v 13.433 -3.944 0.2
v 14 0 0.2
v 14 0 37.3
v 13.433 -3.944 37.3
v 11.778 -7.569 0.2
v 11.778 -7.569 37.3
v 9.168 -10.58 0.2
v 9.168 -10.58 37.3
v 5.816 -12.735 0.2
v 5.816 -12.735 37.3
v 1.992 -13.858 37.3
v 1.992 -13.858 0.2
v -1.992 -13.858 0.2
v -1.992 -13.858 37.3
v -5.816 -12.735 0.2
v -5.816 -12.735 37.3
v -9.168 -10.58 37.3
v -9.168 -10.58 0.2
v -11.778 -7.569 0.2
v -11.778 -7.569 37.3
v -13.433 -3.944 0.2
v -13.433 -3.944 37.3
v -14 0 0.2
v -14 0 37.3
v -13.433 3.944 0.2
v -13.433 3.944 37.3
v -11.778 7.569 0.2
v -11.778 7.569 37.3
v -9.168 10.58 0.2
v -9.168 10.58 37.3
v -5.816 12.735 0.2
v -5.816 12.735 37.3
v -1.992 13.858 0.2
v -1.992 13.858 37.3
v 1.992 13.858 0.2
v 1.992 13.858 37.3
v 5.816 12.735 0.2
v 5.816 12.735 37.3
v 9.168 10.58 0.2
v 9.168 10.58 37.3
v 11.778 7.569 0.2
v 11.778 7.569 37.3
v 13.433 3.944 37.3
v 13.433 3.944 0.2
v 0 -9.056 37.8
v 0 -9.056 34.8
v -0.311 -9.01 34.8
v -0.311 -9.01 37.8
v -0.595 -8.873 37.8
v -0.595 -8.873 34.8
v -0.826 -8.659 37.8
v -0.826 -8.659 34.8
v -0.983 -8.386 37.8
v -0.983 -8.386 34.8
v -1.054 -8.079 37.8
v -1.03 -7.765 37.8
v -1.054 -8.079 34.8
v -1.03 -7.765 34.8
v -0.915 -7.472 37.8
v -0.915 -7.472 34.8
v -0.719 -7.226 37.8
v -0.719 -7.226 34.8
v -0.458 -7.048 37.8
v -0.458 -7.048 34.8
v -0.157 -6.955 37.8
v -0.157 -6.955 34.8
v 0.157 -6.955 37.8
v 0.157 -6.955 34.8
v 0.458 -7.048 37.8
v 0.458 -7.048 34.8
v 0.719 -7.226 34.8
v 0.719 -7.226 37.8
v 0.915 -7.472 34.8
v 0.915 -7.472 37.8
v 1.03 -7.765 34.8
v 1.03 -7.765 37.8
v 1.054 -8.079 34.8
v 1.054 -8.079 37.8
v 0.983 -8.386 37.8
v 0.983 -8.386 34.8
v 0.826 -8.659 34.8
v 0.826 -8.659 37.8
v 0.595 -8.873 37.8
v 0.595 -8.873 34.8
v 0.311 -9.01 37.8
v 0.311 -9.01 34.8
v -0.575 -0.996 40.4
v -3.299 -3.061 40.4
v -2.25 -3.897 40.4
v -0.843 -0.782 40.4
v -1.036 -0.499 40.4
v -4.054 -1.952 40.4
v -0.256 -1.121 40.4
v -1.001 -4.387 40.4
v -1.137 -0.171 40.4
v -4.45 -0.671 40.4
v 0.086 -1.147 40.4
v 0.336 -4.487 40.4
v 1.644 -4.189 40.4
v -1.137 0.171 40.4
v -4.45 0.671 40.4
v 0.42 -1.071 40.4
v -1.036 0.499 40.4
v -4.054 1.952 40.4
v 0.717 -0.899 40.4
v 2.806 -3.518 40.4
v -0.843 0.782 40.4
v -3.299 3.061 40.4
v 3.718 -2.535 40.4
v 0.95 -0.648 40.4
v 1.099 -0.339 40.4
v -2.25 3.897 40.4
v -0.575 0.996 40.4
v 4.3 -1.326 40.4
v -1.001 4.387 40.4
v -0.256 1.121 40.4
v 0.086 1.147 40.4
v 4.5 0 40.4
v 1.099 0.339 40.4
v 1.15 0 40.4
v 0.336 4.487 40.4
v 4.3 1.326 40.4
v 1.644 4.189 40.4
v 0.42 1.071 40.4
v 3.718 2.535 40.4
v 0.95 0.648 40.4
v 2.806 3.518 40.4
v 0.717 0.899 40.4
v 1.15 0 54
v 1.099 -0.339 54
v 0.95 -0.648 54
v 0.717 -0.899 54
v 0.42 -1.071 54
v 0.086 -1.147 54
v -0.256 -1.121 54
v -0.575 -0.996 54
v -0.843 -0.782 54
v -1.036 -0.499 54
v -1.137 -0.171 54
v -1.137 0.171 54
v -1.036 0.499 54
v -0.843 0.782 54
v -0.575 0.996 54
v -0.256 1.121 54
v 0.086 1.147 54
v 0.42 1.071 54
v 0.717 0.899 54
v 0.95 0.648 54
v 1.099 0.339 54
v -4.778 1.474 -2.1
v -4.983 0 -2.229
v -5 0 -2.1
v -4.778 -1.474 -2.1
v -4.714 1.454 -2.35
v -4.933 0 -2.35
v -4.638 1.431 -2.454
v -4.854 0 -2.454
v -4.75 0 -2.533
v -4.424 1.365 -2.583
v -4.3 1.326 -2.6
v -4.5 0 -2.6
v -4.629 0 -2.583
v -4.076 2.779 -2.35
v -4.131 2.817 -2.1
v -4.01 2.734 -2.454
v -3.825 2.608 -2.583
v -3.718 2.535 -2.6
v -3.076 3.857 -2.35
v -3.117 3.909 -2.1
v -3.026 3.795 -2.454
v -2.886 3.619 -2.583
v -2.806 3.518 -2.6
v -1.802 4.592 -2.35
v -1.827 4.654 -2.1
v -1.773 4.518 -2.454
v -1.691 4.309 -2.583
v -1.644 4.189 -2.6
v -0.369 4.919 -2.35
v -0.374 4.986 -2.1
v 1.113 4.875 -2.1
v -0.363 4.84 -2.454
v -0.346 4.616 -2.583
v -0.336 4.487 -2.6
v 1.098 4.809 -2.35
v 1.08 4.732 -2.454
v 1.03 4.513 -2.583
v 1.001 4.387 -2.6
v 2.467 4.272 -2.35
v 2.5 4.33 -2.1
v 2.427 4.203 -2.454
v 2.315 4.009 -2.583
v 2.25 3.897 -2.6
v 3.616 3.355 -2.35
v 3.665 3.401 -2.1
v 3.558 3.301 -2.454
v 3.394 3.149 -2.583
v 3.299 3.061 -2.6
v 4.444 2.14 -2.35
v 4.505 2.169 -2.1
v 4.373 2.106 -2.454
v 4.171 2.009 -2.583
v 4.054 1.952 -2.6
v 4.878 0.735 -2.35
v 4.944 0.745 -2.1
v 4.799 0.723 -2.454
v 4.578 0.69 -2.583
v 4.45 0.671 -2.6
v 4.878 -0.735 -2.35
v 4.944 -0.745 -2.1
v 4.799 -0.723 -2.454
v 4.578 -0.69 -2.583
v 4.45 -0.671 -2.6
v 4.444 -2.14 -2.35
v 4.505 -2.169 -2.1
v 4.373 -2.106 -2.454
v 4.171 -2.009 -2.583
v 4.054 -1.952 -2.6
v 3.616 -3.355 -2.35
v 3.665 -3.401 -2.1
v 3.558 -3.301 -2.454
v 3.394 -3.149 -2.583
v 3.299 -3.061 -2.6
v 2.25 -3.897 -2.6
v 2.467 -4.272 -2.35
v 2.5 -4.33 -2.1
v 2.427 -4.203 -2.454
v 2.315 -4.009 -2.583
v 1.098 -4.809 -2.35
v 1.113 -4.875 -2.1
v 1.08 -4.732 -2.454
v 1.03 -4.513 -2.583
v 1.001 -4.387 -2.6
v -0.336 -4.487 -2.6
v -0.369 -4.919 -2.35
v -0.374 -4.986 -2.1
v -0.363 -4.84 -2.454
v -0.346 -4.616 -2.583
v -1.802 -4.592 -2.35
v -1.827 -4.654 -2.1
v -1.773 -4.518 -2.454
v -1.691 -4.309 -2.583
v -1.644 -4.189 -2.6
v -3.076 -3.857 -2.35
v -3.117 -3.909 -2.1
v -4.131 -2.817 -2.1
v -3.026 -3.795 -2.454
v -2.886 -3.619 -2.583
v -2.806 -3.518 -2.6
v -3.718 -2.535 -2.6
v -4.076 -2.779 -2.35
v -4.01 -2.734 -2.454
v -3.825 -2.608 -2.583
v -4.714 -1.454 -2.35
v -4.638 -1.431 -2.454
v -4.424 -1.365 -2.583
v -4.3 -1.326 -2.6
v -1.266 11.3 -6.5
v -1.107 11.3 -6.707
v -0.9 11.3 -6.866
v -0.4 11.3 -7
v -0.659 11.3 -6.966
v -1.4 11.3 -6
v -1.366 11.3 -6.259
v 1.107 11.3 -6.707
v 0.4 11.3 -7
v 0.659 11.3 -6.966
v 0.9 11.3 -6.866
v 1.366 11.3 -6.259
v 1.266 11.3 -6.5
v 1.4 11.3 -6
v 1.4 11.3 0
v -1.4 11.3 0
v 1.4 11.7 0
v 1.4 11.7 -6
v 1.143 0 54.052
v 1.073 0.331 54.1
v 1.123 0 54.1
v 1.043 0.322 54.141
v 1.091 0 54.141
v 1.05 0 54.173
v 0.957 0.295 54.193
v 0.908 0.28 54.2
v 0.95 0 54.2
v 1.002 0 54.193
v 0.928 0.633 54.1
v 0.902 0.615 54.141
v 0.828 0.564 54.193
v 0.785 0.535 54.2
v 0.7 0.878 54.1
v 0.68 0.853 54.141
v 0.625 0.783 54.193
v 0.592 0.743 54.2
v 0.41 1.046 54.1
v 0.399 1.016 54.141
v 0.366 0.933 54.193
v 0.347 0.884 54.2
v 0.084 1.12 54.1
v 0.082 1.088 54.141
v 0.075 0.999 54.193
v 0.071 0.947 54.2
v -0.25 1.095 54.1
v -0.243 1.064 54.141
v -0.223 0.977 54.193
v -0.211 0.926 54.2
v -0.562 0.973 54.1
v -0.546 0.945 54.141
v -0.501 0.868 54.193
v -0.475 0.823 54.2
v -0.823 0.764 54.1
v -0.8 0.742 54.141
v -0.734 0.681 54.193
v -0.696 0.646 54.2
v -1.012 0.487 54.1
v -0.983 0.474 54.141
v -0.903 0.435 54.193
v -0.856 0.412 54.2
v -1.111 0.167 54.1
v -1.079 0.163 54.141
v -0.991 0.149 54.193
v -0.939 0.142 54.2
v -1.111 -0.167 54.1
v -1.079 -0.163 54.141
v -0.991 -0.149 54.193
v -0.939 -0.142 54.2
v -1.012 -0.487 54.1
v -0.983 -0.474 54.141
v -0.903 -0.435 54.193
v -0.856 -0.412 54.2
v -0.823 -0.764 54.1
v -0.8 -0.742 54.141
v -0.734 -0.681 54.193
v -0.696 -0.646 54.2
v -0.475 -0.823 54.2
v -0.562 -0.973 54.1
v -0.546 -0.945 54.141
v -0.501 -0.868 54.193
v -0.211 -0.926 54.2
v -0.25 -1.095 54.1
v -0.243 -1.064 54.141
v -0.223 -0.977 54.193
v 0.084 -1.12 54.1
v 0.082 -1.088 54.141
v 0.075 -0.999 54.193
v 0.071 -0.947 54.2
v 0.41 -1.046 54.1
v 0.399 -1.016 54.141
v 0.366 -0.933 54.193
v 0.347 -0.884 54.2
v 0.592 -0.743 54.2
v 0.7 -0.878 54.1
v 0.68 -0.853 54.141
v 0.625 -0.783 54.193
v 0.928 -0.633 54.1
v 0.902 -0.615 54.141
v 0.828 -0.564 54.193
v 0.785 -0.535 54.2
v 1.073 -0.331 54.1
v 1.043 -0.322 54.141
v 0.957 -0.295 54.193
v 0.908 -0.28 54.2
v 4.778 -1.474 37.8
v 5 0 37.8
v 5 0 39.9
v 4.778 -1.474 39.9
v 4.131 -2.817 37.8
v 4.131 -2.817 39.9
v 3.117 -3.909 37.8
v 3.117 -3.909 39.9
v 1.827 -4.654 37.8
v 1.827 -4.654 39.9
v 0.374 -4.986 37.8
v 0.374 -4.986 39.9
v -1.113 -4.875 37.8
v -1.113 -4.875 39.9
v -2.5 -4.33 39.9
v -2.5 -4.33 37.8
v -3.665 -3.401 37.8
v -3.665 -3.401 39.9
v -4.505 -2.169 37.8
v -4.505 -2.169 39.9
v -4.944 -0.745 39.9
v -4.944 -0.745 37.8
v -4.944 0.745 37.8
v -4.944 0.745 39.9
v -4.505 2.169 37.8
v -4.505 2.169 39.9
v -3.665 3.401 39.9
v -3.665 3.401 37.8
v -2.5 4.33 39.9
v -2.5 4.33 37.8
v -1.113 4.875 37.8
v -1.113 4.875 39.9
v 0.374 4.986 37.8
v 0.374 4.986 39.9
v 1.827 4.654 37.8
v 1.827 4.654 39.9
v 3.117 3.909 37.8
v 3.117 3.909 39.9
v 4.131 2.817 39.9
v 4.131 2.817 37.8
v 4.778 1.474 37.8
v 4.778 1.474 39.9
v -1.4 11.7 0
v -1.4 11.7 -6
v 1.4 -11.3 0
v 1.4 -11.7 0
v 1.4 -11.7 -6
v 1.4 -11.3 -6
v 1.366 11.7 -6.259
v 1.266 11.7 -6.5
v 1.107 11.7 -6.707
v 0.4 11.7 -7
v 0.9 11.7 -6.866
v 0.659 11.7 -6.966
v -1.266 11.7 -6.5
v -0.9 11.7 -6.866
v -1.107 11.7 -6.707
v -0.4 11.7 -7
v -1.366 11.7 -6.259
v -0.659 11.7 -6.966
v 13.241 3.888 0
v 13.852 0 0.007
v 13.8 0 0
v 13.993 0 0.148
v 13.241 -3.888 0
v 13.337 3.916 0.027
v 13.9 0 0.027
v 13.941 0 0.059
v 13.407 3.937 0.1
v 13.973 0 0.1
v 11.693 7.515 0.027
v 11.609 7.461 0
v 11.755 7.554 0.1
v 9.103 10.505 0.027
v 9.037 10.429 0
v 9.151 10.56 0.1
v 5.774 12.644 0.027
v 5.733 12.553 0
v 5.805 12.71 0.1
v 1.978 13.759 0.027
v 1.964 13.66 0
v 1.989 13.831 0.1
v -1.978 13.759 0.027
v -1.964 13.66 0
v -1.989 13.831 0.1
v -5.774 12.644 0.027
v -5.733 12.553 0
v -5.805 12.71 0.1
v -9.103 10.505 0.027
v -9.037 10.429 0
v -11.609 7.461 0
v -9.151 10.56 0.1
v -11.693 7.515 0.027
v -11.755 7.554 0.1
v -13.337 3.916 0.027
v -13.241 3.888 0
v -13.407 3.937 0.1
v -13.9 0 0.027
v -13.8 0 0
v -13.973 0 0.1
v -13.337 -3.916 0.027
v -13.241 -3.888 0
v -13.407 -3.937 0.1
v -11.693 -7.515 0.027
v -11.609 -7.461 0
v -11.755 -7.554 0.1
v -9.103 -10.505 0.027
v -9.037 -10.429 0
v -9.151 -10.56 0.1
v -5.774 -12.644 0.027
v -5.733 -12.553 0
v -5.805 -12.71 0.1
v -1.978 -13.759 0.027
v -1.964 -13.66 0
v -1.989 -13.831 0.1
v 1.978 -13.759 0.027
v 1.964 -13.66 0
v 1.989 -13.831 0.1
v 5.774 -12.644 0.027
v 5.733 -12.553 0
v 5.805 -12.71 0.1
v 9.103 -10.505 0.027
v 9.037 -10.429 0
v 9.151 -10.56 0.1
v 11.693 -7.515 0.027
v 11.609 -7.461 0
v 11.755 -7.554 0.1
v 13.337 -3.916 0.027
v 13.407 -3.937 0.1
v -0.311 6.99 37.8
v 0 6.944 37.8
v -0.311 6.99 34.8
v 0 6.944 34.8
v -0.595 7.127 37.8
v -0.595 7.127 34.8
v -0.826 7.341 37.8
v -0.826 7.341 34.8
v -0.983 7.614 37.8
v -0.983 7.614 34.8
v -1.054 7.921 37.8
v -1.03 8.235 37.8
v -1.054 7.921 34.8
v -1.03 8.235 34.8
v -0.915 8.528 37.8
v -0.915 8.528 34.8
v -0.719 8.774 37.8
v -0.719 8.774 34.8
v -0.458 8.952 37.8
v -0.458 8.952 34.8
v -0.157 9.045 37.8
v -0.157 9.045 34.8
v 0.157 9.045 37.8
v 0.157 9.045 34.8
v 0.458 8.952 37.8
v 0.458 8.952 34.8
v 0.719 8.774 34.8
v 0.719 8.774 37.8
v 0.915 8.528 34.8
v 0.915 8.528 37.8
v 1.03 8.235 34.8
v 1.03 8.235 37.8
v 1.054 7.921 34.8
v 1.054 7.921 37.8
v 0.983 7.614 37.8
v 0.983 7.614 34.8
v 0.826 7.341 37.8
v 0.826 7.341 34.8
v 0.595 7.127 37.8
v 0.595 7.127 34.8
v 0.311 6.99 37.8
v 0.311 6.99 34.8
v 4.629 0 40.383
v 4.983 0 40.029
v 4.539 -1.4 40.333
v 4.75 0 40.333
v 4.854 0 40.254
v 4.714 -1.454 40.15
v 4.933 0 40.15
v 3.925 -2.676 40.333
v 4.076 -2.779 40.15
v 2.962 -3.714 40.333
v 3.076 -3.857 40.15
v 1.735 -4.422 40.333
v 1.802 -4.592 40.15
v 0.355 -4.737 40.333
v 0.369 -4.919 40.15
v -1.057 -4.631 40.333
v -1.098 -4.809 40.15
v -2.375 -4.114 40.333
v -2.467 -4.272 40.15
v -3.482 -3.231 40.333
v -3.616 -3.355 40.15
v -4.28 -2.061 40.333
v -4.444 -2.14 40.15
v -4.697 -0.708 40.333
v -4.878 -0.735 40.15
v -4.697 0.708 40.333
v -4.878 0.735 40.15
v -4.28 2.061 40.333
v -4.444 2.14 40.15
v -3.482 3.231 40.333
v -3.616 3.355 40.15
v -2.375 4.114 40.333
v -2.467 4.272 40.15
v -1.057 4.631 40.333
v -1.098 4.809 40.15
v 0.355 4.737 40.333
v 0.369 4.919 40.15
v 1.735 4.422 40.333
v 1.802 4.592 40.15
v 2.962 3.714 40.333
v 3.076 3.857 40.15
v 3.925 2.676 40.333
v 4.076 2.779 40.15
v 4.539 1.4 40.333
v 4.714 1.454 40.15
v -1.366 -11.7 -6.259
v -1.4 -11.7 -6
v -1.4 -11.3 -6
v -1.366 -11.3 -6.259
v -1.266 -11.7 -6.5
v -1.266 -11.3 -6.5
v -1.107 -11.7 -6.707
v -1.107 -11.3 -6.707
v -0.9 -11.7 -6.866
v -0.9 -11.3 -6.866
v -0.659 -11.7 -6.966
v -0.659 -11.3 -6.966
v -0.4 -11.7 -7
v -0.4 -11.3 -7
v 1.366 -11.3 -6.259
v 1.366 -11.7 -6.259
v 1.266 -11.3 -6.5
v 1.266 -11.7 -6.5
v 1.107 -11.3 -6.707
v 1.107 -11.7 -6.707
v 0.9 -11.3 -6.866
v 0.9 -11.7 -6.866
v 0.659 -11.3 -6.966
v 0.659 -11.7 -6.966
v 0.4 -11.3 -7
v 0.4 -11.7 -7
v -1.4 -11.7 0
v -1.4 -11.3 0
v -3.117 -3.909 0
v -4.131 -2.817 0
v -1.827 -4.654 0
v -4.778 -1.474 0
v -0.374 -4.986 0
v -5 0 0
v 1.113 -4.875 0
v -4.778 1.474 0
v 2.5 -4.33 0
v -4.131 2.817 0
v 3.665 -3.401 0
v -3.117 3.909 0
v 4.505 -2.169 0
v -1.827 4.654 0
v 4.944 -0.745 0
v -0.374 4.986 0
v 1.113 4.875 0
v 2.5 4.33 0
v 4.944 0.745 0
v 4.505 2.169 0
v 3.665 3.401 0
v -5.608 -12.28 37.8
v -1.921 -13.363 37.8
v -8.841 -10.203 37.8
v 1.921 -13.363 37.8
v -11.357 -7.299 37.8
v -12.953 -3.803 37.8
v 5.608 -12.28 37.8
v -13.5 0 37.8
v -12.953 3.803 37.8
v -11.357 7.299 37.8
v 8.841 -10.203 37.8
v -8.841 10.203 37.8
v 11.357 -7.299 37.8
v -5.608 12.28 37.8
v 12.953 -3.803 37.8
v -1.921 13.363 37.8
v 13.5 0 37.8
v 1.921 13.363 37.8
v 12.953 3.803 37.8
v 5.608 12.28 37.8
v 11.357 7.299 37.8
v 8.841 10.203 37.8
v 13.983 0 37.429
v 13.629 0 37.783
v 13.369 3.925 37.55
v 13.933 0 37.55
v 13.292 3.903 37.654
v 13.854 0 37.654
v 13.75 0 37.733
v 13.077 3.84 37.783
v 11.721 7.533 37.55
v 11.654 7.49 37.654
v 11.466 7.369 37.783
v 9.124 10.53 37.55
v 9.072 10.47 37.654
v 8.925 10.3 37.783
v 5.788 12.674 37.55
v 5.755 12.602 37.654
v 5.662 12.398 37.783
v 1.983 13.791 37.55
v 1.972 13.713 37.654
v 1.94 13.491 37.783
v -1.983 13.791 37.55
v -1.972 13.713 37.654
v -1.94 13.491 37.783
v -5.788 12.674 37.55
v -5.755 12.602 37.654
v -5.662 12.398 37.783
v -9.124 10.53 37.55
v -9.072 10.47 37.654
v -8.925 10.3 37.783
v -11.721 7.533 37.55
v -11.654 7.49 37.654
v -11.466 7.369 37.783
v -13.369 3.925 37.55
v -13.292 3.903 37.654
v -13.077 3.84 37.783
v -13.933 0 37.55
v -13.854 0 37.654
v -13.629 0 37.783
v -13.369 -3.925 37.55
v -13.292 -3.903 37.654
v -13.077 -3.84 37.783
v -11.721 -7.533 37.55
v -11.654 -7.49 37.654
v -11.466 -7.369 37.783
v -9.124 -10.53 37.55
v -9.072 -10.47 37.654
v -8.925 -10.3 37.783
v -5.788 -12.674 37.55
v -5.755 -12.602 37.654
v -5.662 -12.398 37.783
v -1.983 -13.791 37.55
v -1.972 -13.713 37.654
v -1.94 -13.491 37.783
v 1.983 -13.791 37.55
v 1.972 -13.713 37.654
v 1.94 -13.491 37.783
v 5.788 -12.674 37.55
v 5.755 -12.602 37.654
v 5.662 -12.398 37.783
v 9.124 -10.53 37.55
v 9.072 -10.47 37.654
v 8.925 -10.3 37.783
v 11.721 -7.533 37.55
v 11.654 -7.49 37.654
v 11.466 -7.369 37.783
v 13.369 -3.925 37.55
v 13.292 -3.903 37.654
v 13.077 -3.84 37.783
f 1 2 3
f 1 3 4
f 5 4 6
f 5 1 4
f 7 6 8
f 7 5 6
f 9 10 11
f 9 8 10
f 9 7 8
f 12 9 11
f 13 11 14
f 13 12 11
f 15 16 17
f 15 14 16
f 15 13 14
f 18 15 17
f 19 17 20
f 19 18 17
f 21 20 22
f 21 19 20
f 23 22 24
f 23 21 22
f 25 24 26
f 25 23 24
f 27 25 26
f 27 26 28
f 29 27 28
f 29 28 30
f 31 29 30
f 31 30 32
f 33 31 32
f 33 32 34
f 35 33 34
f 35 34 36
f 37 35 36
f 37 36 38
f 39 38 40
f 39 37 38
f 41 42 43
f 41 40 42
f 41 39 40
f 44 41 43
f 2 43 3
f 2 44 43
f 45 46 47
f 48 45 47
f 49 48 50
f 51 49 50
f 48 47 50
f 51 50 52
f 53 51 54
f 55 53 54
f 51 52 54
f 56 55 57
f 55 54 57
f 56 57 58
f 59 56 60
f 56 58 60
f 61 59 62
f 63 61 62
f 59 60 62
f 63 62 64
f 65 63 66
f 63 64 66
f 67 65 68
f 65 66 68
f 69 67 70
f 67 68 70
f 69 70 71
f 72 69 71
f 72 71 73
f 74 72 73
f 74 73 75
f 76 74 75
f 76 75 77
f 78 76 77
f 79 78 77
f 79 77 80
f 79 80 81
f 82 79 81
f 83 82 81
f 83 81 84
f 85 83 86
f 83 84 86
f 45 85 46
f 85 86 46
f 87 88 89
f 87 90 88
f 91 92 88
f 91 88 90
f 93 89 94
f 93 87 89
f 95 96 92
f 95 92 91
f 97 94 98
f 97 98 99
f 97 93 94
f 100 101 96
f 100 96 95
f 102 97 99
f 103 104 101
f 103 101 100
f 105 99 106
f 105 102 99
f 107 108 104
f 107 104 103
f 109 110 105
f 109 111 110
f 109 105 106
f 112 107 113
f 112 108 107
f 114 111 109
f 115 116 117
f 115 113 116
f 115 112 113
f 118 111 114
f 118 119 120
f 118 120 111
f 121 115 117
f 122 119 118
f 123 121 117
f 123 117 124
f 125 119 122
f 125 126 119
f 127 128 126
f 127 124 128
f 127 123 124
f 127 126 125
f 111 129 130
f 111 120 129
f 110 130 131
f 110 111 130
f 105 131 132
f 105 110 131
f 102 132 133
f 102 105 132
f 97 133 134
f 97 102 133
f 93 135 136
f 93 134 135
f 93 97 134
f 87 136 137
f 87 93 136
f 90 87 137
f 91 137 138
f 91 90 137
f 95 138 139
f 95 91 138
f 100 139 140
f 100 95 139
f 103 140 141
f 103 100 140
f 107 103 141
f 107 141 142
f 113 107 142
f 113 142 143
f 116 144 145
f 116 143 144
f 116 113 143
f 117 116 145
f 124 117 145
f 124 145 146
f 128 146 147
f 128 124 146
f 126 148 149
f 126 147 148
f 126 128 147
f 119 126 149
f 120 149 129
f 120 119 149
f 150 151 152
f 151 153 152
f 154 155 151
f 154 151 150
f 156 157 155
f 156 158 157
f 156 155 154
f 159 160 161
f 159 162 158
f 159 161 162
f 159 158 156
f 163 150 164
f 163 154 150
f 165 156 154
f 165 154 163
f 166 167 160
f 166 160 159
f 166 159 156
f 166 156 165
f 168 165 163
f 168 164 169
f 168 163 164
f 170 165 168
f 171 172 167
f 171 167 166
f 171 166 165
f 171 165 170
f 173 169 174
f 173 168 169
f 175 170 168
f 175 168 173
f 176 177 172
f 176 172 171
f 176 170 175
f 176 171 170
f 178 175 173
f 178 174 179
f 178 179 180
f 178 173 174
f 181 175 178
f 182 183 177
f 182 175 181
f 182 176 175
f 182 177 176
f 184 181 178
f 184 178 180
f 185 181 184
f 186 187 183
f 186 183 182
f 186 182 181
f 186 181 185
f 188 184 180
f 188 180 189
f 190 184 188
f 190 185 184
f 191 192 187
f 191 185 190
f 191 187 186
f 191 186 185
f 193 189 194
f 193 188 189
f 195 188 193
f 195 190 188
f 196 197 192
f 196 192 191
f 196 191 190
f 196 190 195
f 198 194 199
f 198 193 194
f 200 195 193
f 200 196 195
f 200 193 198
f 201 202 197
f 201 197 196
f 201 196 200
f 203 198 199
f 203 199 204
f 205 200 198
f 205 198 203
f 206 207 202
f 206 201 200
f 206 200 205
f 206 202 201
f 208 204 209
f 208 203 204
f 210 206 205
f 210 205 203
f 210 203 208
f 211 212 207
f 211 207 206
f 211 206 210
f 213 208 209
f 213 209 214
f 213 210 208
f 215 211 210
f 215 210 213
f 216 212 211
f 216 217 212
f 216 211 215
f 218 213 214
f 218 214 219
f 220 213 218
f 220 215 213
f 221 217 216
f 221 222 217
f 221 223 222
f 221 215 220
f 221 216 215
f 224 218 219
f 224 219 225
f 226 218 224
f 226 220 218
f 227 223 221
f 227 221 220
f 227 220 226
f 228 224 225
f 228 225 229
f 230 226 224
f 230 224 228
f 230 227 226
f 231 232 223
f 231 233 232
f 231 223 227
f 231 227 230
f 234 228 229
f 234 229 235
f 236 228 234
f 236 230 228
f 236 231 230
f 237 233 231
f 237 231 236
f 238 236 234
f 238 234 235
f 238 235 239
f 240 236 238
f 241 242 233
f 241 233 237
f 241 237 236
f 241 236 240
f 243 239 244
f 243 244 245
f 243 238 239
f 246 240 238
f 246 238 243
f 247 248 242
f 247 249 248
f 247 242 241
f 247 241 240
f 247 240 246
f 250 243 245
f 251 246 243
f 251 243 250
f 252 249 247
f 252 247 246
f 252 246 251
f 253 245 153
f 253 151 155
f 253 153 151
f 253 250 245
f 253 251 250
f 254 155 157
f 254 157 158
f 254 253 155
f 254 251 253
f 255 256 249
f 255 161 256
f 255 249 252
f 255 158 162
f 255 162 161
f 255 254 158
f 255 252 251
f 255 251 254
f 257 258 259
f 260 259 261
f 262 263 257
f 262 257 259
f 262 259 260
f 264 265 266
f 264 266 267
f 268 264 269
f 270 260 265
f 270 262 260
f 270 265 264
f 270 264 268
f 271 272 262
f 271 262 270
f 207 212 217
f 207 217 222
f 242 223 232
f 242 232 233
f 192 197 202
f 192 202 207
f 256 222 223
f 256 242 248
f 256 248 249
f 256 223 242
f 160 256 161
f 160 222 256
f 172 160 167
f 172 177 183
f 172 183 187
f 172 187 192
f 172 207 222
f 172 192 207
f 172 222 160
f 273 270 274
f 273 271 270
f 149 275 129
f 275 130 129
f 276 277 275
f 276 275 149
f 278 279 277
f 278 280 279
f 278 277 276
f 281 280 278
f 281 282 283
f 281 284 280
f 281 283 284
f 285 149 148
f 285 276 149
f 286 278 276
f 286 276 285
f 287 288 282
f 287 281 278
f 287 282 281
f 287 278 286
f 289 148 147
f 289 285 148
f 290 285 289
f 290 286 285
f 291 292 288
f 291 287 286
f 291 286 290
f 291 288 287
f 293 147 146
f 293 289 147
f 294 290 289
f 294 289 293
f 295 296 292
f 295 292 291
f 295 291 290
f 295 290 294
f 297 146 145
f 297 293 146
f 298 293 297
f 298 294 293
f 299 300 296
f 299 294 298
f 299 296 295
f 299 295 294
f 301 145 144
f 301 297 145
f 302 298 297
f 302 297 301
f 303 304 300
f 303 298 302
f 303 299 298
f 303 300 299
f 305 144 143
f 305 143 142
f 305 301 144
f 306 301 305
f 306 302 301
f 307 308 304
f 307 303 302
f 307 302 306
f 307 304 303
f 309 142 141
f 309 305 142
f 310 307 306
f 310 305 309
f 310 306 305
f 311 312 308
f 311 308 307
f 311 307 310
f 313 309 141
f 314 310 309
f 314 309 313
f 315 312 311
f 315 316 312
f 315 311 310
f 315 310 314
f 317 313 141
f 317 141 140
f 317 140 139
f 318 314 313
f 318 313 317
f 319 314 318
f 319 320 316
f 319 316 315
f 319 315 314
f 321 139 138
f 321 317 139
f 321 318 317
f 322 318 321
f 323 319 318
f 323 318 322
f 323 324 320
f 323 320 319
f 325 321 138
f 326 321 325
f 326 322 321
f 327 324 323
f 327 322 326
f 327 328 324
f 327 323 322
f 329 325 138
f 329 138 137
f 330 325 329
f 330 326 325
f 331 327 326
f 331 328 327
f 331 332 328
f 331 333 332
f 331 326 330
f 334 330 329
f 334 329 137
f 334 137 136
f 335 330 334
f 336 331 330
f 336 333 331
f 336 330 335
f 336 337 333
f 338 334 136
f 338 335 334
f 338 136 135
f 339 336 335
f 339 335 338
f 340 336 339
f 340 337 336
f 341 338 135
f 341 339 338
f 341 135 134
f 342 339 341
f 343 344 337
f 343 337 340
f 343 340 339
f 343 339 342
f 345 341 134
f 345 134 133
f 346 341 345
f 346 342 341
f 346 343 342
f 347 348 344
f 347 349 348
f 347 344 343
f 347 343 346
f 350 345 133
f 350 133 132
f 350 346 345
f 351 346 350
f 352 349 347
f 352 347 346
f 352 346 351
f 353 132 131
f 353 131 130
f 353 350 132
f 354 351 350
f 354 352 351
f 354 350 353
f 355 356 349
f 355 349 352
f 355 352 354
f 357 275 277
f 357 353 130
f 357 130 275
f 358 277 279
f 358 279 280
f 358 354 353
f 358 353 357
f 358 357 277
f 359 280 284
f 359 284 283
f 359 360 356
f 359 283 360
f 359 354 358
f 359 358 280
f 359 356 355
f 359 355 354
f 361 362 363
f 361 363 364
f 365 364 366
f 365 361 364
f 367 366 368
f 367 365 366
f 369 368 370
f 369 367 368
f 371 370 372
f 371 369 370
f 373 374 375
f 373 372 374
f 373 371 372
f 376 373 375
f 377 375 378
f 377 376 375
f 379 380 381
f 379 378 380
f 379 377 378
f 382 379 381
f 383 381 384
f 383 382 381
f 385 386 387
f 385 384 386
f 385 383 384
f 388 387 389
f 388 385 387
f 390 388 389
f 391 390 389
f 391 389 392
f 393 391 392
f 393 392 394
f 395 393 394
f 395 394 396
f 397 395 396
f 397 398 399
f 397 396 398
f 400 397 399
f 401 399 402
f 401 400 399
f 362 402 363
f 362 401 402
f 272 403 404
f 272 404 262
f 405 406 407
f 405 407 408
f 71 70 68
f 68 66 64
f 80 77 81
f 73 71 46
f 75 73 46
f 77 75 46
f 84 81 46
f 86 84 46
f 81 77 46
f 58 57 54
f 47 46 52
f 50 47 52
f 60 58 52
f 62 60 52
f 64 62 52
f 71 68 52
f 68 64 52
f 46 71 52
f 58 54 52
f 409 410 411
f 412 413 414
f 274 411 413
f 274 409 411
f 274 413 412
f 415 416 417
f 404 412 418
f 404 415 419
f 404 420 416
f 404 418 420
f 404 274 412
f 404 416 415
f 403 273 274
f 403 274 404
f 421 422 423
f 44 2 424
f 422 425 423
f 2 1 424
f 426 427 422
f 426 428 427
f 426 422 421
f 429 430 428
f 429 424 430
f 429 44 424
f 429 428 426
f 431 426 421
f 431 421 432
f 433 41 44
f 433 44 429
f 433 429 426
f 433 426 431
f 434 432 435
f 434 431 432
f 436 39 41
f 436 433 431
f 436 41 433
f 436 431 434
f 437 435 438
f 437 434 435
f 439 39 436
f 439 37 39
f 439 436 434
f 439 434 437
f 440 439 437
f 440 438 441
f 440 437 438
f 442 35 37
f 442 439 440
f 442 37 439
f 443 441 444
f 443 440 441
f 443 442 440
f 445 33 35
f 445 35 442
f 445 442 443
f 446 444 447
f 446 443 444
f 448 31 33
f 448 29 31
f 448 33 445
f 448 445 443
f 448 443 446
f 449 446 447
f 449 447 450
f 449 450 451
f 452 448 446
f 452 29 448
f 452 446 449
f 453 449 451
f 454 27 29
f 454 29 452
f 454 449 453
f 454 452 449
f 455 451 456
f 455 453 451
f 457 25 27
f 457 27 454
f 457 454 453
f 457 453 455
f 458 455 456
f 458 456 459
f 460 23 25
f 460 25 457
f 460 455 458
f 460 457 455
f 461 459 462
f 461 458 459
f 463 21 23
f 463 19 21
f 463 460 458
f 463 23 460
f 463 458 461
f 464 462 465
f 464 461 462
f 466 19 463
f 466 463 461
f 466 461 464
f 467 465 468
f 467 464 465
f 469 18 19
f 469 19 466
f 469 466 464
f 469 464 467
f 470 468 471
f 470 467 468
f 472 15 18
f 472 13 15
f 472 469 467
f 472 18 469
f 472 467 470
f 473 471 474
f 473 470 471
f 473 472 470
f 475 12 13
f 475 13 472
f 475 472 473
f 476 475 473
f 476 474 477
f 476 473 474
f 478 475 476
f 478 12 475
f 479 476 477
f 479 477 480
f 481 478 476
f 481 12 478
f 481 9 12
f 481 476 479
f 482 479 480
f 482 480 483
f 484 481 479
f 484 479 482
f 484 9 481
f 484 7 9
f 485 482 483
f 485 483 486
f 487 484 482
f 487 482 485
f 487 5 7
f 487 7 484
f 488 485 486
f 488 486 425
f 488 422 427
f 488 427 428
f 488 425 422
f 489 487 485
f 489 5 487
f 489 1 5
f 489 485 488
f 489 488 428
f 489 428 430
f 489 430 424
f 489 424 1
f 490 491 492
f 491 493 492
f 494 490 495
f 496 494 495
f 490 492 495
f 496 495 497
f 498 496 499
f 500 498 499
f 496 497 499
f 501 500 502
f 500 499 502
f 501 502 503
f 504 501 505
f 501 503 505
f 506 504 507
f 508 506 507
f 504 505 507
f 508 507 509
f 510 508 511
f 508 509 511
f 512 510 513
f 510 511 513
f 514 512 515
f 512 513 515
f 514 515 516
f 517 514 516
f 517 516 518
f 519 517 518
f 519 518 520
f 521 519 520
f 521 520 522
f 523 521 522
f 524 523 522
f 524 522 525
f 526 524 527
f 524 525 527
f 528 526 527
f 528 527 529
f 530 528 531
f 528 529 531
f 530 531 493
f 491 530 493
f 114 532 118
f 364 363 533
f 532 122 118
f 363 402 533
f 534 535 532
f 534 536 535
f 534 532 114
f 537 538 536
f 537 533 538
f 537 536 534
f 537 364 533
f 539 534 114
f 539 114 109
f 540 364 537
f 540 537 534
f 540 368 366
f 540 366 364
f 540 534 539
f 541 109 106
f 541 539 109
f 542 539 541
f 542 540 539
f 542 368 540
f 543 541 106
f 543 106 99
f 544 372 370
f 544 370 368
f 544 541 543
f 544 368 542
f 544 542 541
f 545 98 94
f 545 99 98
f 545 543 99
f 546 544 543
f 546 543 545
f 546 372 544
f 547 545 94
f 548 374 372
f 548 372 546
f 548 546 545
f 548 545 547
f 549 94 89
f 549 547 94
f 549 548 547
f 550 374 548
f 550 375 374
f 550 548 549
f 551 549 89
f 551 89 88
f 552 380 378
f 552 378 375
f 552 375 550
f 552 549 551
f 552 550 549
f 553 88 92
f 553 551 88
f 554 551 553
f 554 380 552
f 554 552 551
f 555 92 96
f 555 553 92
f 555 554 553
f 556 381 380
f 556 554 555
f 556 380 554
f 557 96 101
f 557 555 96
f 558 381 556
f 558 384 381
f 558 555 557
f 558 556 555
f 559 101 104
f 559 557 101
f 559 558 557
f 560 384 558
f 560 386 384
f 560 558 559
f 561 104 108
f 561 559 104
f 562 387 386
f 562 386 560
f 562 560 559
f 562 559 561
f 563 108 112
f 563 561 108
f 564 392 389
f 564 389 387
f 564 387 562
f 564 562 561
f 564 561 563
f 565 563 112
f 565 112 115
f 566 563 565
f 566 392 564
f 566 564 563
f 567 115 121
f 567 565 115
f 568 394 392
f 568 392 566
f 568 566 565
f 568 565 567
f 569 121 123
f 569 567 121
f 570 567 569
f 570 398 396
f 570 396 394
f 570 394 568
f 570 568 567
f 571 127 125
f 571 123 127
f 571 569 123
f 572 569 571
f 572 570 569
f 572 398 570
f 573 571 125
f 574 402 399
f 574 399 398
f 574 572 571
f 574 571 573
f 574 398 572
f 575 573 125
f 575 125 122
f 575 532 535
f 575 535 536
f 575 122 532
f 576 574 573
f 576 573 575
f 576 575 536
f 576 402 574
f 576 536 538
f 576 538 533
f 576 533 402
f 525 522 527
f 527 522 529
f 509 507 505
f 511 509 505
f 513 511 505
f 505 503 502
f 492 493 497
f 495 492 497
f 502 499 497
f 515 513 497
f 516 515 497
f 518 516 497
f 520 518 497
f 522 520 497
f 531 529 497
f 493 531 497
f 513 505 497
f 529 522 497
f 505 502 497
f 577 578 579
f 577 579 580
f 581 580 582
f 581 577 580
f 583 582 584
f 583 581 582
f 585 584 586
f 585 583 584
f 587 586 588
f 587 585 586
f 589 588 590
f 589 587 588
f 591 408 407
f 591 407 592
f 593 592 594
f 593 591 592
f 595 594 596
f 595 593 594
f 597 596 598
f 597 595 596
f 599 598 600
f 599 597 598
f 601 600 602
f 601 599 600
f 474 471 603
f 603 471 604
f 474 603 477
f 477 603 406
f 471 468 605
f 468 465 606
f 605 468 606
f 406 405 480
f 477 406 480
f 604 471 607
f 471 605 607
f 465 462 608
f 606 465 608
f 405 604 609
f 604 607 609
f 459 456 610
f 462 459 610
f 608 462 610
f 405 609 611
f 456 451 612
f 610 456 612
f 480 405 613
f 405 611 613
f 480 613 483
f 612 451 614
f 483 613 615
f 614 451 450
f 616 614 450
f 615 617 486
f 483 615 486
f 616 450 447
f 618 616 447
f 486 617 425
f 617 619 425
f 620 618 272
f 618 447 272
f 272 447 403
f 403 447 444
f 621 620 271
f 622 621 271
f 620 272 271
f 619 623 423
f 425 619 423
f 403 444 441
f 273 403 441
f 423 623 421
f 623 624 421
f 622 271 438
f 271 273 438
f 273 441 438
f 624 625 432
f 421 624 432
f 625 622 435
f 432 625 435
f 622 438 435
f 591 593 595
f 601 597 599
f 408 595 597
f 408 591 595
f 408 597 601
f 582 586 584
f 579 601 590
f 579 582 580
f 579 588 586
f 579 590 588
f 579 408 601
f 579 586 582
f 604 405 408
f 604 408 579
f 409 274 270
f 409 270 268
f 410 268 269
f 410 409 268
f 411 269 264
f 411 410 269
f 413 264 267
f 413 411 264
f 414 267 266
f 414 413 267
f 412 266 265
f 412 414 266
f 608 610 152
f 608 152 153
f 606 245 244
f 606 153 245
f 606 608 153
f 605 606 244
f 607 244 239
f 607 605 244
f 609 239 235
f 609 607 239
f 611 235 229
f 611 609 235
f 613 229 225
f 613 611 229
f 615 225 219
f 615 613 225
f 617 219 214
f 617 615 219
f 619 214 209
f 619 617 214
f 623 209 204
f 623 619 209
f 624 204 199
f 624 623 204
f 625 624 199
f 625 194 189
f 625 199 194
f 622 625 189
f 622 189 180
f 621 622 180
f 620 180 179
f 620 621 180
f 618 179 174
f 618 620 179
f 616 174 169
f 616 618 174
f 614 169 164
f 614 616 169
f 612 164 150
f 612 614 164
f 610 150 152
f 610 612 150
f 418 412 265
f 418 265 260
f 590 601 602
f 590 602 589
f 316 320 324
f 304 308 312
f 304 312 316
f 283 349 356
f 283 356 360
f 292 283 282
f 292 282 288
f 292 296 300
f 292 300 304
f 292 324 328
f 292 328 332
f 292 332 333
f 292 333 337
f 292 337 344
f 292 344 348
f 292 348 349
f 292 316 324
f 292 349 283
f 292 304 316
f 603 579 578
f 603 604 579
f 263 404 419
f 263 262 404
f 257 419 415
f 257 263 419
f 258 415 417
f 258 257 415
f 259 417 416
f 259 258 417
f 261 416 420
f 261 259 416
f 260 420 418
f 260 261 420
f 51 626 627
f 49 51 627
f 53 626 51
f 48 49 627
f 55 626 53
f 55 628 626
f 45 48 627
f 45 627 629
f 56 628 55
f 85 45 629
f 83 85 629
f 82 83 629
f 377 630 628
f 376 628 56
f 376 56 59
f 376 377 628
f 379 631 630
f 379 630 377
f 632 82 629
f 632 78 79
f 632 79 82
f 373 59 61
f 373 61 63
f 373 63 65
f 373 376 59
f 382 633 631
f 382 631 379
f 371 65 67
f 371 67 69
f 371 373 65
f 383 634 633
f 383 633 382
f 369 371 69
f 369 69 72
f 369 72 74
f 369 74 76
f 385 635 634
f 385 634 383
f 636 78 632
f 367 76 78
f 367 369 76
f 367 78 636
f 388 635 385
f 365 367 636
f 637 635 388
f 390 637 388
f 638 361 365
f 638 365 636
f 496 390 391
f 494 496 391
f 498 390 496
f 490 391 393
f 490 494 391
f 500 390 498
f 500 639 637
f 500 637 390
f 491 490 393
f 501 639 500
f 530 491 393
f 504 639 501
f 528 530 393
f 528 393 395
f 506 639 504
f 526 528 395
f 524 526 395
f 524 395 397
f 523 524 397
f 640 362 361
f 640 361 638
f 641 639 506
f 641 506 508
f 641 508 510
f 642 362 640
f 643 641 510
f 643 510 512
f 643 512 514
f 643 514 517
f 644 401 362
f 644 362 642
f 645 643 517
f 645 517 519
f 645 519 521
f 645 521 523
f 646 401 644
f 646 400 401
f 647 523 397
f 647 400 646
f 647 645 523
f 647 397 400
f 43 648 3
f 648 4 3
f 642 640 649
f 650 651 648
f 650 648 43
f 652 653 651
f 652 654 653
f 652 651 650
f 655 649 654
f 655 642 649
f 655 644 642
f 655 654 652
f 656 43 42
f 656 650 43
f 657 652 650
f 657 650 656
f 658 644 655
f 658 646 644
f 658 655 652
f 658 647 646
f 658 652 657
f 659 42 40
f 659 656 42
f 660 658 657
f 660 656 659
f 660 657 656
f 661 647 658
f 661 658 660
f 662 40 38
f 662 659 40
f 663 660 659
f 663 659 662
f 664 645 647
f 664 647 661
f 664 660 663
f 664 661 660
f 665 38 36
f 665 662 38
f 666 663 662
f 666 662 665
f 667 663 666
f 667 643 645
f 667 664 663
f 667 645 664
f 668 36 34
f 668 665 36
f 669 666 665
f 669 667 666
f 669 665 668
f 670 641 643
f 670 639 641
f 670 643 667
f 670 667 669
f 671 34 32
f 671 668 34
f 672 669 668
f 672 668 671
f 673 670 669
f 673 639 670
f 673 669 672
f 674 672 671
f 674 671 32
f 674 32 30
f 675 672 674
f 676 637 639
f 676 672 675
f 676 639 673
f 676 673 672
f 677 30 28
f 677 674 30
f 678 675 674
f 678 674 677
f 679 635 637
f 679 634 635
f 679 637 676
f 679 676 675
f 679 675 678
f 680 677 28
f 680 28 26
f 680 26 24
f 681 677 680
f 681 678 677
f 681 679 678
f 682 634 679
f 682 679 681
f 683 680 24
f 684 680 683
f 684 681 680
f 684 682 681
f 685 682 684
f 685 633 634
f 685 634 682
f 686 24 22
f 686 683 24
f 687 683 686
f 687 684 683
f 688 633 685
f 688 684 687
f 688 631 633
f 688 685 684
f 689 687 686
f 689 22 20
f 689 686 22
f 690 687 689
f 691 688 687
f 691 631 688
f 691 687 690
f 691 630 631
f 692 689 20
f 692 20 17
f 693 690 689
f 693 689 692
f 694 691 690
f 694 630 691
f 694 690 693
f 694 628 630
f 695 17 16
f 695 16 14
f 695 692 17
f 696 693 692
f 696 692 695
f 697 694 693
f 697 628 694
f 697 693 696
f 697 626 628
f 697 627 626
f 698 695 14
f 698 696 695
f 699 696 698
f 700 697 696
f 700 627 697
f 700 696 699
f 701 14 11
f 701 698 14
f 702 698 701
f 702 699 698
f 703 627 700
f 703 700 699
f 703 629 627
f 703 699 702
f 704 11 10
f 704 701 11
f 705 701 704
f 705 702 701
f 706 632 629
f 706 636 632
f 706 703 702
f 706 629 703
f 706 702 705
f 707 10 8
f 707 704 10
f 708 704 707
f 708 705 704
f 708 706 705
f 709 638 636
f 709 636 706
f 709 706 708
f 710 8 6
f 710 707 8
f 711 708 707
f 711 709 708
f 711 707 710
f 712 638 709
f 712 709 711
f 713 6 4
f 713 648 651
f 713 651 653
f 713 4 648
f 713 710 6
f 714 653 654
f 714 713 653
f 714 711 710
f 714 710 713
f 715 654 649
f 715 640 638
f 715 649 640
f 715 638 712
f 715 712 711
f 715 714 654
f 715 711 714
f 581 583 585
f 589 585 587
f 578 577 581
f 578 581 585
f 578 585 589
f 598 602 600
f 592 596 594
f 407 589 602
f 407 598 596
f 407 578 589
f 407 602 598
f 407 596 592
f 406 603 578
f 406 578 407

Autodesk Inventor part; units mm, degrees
ref_plane "YZ Plane" through (0, 0, 0) normal (1, 0, 0) x (0, 1, 0)
ref_plane "XZ Plane" through (0, 0, 0) normal (0, 1, 0) x (-1, 0, 0)
ref_plane "XY Plane" through (0, 0, 0) normal (0, 0, 1) x (1, 0, 0)
sketch "スケッチ1" plane through (0, 0, 0) normal (0, 0, 1) x (1, 0, 0)
  circle A0 centre (0, 0) radius 14
  dimension "d0" = 28
extrude "押し出し1" add sketch "スケッチ1" along normal blind 37.8
sketch "スケッチ2" plane through (0, 0, 37.8) normal (0, 0, 1) x (1, 0, 0)
  circle A0 centre (0, 0) radius 5
  dimension "d3" = 10
extrude "押し出し2" add sketch "スケッチ2" along normal blind 2.6
sketch "スケッチ3" plane through (0, 0, 40.4) normal (0, 0, 1) x (1, 0, 0)
  circle A0 centre (0, 0) radius 1.15
  dimension "d6" = 2.3
extrude "押し出し3" add sketch "スケッチ3" along normal blind 13.8
sketch "スケッチ4" plane through (0, 0, 0) normal (0, 0, -1) x (-1, 0, 0)
  circle A0 centre (0, 0) radius 1.15 projected
  circle A1 centre (0, 0) radius 5
  dimension "d9" = 10
extrude "押し出し4" add sketch "スケッチ4" along normal blind 2.6 contours A0 | A1
sketch "スケッチ5" plane through (0, 0, 0) normal (0, 0, -1) x (-1, 0, 0)
  line L0 (1.4, -11.7) -> (-1.4, -11.7)
  line L1 (-1.4, -11.7) -> (-1.4, -11.3)
  line L2 (-1.4, -11.3) -> (1.4, -11.3)
  line L3 (1.4, -11.3) -> (1.4, -11.7)
  line L4 (1.4, 11.3) -> (-1.4, 11.3)
  line L5 (-1.4, 11.3) -> (-1.4, 11.7)
  line L6 (-1.4, 11.7) -> (1.4, 11.7)
  line L7 (1.4, 11.7) -> (1.4, 11.3)
  line L8 (0, 0) -> (0, -11.3)
  circle A0 centre (0, 0) radius 1.15 projected
  line L9 (0, 0) -> (0, 11.3)
  dimension "d12" = 2.8
  dimension "d13" = 0.4
  dimension "d14" = 22.6
  dimension "d15" = 1.4
extrude "押し出し5" add sketch "スケッチ5" along normal blind 7 contours L4 L5 L6 L7 | L0 L1 L2 L3
fillet "フィレット1" radius 0.5 1 edges at (-14, 0, 37.8)
fillet "フィレット2" radius 0.2 1 edges at (-1.15, 0, 54.2)
fillet "フィレット3" radius 0.5 1 edges at (-5, 0, 40.4)
fillet "フィレット4" radius 0.5 1 edges at (5, 0, -2.6)
fillet "フィレット5" radius 1 1 edges at (-1.4, -11.5, -7)
fillet "フィレット6" radius 1 1 edges at (1.4, -11.5, -7)
fillet "フィレット7" radius 1 1 edges at (-1.4, 11.5, -7)
fillet "フィレット8" radius 1 1 edges at (1.4, 11.5, -7)
fillet "フィレット9" radius 0.2 1 edges at (-14, 0, 0)
sketch "スケッチ6" plane through (0, 0, 37.8) normal (0, 0, 1) x (1, 0, 0)
  circle A0 centre (0, 0) radius 8
  point P0 (0, 8)
  point P1 (0, -8)
  dimension "d27" = 16
hole "穴1" at (0, 8, 37.8) at (0, -8, 37.8) direction (0, 0, -1) diameter 2.113 depth 3 thread size "M2.6x0.45" class "6H" standard "ISO Metric profile"
properties part number "RS-380"
